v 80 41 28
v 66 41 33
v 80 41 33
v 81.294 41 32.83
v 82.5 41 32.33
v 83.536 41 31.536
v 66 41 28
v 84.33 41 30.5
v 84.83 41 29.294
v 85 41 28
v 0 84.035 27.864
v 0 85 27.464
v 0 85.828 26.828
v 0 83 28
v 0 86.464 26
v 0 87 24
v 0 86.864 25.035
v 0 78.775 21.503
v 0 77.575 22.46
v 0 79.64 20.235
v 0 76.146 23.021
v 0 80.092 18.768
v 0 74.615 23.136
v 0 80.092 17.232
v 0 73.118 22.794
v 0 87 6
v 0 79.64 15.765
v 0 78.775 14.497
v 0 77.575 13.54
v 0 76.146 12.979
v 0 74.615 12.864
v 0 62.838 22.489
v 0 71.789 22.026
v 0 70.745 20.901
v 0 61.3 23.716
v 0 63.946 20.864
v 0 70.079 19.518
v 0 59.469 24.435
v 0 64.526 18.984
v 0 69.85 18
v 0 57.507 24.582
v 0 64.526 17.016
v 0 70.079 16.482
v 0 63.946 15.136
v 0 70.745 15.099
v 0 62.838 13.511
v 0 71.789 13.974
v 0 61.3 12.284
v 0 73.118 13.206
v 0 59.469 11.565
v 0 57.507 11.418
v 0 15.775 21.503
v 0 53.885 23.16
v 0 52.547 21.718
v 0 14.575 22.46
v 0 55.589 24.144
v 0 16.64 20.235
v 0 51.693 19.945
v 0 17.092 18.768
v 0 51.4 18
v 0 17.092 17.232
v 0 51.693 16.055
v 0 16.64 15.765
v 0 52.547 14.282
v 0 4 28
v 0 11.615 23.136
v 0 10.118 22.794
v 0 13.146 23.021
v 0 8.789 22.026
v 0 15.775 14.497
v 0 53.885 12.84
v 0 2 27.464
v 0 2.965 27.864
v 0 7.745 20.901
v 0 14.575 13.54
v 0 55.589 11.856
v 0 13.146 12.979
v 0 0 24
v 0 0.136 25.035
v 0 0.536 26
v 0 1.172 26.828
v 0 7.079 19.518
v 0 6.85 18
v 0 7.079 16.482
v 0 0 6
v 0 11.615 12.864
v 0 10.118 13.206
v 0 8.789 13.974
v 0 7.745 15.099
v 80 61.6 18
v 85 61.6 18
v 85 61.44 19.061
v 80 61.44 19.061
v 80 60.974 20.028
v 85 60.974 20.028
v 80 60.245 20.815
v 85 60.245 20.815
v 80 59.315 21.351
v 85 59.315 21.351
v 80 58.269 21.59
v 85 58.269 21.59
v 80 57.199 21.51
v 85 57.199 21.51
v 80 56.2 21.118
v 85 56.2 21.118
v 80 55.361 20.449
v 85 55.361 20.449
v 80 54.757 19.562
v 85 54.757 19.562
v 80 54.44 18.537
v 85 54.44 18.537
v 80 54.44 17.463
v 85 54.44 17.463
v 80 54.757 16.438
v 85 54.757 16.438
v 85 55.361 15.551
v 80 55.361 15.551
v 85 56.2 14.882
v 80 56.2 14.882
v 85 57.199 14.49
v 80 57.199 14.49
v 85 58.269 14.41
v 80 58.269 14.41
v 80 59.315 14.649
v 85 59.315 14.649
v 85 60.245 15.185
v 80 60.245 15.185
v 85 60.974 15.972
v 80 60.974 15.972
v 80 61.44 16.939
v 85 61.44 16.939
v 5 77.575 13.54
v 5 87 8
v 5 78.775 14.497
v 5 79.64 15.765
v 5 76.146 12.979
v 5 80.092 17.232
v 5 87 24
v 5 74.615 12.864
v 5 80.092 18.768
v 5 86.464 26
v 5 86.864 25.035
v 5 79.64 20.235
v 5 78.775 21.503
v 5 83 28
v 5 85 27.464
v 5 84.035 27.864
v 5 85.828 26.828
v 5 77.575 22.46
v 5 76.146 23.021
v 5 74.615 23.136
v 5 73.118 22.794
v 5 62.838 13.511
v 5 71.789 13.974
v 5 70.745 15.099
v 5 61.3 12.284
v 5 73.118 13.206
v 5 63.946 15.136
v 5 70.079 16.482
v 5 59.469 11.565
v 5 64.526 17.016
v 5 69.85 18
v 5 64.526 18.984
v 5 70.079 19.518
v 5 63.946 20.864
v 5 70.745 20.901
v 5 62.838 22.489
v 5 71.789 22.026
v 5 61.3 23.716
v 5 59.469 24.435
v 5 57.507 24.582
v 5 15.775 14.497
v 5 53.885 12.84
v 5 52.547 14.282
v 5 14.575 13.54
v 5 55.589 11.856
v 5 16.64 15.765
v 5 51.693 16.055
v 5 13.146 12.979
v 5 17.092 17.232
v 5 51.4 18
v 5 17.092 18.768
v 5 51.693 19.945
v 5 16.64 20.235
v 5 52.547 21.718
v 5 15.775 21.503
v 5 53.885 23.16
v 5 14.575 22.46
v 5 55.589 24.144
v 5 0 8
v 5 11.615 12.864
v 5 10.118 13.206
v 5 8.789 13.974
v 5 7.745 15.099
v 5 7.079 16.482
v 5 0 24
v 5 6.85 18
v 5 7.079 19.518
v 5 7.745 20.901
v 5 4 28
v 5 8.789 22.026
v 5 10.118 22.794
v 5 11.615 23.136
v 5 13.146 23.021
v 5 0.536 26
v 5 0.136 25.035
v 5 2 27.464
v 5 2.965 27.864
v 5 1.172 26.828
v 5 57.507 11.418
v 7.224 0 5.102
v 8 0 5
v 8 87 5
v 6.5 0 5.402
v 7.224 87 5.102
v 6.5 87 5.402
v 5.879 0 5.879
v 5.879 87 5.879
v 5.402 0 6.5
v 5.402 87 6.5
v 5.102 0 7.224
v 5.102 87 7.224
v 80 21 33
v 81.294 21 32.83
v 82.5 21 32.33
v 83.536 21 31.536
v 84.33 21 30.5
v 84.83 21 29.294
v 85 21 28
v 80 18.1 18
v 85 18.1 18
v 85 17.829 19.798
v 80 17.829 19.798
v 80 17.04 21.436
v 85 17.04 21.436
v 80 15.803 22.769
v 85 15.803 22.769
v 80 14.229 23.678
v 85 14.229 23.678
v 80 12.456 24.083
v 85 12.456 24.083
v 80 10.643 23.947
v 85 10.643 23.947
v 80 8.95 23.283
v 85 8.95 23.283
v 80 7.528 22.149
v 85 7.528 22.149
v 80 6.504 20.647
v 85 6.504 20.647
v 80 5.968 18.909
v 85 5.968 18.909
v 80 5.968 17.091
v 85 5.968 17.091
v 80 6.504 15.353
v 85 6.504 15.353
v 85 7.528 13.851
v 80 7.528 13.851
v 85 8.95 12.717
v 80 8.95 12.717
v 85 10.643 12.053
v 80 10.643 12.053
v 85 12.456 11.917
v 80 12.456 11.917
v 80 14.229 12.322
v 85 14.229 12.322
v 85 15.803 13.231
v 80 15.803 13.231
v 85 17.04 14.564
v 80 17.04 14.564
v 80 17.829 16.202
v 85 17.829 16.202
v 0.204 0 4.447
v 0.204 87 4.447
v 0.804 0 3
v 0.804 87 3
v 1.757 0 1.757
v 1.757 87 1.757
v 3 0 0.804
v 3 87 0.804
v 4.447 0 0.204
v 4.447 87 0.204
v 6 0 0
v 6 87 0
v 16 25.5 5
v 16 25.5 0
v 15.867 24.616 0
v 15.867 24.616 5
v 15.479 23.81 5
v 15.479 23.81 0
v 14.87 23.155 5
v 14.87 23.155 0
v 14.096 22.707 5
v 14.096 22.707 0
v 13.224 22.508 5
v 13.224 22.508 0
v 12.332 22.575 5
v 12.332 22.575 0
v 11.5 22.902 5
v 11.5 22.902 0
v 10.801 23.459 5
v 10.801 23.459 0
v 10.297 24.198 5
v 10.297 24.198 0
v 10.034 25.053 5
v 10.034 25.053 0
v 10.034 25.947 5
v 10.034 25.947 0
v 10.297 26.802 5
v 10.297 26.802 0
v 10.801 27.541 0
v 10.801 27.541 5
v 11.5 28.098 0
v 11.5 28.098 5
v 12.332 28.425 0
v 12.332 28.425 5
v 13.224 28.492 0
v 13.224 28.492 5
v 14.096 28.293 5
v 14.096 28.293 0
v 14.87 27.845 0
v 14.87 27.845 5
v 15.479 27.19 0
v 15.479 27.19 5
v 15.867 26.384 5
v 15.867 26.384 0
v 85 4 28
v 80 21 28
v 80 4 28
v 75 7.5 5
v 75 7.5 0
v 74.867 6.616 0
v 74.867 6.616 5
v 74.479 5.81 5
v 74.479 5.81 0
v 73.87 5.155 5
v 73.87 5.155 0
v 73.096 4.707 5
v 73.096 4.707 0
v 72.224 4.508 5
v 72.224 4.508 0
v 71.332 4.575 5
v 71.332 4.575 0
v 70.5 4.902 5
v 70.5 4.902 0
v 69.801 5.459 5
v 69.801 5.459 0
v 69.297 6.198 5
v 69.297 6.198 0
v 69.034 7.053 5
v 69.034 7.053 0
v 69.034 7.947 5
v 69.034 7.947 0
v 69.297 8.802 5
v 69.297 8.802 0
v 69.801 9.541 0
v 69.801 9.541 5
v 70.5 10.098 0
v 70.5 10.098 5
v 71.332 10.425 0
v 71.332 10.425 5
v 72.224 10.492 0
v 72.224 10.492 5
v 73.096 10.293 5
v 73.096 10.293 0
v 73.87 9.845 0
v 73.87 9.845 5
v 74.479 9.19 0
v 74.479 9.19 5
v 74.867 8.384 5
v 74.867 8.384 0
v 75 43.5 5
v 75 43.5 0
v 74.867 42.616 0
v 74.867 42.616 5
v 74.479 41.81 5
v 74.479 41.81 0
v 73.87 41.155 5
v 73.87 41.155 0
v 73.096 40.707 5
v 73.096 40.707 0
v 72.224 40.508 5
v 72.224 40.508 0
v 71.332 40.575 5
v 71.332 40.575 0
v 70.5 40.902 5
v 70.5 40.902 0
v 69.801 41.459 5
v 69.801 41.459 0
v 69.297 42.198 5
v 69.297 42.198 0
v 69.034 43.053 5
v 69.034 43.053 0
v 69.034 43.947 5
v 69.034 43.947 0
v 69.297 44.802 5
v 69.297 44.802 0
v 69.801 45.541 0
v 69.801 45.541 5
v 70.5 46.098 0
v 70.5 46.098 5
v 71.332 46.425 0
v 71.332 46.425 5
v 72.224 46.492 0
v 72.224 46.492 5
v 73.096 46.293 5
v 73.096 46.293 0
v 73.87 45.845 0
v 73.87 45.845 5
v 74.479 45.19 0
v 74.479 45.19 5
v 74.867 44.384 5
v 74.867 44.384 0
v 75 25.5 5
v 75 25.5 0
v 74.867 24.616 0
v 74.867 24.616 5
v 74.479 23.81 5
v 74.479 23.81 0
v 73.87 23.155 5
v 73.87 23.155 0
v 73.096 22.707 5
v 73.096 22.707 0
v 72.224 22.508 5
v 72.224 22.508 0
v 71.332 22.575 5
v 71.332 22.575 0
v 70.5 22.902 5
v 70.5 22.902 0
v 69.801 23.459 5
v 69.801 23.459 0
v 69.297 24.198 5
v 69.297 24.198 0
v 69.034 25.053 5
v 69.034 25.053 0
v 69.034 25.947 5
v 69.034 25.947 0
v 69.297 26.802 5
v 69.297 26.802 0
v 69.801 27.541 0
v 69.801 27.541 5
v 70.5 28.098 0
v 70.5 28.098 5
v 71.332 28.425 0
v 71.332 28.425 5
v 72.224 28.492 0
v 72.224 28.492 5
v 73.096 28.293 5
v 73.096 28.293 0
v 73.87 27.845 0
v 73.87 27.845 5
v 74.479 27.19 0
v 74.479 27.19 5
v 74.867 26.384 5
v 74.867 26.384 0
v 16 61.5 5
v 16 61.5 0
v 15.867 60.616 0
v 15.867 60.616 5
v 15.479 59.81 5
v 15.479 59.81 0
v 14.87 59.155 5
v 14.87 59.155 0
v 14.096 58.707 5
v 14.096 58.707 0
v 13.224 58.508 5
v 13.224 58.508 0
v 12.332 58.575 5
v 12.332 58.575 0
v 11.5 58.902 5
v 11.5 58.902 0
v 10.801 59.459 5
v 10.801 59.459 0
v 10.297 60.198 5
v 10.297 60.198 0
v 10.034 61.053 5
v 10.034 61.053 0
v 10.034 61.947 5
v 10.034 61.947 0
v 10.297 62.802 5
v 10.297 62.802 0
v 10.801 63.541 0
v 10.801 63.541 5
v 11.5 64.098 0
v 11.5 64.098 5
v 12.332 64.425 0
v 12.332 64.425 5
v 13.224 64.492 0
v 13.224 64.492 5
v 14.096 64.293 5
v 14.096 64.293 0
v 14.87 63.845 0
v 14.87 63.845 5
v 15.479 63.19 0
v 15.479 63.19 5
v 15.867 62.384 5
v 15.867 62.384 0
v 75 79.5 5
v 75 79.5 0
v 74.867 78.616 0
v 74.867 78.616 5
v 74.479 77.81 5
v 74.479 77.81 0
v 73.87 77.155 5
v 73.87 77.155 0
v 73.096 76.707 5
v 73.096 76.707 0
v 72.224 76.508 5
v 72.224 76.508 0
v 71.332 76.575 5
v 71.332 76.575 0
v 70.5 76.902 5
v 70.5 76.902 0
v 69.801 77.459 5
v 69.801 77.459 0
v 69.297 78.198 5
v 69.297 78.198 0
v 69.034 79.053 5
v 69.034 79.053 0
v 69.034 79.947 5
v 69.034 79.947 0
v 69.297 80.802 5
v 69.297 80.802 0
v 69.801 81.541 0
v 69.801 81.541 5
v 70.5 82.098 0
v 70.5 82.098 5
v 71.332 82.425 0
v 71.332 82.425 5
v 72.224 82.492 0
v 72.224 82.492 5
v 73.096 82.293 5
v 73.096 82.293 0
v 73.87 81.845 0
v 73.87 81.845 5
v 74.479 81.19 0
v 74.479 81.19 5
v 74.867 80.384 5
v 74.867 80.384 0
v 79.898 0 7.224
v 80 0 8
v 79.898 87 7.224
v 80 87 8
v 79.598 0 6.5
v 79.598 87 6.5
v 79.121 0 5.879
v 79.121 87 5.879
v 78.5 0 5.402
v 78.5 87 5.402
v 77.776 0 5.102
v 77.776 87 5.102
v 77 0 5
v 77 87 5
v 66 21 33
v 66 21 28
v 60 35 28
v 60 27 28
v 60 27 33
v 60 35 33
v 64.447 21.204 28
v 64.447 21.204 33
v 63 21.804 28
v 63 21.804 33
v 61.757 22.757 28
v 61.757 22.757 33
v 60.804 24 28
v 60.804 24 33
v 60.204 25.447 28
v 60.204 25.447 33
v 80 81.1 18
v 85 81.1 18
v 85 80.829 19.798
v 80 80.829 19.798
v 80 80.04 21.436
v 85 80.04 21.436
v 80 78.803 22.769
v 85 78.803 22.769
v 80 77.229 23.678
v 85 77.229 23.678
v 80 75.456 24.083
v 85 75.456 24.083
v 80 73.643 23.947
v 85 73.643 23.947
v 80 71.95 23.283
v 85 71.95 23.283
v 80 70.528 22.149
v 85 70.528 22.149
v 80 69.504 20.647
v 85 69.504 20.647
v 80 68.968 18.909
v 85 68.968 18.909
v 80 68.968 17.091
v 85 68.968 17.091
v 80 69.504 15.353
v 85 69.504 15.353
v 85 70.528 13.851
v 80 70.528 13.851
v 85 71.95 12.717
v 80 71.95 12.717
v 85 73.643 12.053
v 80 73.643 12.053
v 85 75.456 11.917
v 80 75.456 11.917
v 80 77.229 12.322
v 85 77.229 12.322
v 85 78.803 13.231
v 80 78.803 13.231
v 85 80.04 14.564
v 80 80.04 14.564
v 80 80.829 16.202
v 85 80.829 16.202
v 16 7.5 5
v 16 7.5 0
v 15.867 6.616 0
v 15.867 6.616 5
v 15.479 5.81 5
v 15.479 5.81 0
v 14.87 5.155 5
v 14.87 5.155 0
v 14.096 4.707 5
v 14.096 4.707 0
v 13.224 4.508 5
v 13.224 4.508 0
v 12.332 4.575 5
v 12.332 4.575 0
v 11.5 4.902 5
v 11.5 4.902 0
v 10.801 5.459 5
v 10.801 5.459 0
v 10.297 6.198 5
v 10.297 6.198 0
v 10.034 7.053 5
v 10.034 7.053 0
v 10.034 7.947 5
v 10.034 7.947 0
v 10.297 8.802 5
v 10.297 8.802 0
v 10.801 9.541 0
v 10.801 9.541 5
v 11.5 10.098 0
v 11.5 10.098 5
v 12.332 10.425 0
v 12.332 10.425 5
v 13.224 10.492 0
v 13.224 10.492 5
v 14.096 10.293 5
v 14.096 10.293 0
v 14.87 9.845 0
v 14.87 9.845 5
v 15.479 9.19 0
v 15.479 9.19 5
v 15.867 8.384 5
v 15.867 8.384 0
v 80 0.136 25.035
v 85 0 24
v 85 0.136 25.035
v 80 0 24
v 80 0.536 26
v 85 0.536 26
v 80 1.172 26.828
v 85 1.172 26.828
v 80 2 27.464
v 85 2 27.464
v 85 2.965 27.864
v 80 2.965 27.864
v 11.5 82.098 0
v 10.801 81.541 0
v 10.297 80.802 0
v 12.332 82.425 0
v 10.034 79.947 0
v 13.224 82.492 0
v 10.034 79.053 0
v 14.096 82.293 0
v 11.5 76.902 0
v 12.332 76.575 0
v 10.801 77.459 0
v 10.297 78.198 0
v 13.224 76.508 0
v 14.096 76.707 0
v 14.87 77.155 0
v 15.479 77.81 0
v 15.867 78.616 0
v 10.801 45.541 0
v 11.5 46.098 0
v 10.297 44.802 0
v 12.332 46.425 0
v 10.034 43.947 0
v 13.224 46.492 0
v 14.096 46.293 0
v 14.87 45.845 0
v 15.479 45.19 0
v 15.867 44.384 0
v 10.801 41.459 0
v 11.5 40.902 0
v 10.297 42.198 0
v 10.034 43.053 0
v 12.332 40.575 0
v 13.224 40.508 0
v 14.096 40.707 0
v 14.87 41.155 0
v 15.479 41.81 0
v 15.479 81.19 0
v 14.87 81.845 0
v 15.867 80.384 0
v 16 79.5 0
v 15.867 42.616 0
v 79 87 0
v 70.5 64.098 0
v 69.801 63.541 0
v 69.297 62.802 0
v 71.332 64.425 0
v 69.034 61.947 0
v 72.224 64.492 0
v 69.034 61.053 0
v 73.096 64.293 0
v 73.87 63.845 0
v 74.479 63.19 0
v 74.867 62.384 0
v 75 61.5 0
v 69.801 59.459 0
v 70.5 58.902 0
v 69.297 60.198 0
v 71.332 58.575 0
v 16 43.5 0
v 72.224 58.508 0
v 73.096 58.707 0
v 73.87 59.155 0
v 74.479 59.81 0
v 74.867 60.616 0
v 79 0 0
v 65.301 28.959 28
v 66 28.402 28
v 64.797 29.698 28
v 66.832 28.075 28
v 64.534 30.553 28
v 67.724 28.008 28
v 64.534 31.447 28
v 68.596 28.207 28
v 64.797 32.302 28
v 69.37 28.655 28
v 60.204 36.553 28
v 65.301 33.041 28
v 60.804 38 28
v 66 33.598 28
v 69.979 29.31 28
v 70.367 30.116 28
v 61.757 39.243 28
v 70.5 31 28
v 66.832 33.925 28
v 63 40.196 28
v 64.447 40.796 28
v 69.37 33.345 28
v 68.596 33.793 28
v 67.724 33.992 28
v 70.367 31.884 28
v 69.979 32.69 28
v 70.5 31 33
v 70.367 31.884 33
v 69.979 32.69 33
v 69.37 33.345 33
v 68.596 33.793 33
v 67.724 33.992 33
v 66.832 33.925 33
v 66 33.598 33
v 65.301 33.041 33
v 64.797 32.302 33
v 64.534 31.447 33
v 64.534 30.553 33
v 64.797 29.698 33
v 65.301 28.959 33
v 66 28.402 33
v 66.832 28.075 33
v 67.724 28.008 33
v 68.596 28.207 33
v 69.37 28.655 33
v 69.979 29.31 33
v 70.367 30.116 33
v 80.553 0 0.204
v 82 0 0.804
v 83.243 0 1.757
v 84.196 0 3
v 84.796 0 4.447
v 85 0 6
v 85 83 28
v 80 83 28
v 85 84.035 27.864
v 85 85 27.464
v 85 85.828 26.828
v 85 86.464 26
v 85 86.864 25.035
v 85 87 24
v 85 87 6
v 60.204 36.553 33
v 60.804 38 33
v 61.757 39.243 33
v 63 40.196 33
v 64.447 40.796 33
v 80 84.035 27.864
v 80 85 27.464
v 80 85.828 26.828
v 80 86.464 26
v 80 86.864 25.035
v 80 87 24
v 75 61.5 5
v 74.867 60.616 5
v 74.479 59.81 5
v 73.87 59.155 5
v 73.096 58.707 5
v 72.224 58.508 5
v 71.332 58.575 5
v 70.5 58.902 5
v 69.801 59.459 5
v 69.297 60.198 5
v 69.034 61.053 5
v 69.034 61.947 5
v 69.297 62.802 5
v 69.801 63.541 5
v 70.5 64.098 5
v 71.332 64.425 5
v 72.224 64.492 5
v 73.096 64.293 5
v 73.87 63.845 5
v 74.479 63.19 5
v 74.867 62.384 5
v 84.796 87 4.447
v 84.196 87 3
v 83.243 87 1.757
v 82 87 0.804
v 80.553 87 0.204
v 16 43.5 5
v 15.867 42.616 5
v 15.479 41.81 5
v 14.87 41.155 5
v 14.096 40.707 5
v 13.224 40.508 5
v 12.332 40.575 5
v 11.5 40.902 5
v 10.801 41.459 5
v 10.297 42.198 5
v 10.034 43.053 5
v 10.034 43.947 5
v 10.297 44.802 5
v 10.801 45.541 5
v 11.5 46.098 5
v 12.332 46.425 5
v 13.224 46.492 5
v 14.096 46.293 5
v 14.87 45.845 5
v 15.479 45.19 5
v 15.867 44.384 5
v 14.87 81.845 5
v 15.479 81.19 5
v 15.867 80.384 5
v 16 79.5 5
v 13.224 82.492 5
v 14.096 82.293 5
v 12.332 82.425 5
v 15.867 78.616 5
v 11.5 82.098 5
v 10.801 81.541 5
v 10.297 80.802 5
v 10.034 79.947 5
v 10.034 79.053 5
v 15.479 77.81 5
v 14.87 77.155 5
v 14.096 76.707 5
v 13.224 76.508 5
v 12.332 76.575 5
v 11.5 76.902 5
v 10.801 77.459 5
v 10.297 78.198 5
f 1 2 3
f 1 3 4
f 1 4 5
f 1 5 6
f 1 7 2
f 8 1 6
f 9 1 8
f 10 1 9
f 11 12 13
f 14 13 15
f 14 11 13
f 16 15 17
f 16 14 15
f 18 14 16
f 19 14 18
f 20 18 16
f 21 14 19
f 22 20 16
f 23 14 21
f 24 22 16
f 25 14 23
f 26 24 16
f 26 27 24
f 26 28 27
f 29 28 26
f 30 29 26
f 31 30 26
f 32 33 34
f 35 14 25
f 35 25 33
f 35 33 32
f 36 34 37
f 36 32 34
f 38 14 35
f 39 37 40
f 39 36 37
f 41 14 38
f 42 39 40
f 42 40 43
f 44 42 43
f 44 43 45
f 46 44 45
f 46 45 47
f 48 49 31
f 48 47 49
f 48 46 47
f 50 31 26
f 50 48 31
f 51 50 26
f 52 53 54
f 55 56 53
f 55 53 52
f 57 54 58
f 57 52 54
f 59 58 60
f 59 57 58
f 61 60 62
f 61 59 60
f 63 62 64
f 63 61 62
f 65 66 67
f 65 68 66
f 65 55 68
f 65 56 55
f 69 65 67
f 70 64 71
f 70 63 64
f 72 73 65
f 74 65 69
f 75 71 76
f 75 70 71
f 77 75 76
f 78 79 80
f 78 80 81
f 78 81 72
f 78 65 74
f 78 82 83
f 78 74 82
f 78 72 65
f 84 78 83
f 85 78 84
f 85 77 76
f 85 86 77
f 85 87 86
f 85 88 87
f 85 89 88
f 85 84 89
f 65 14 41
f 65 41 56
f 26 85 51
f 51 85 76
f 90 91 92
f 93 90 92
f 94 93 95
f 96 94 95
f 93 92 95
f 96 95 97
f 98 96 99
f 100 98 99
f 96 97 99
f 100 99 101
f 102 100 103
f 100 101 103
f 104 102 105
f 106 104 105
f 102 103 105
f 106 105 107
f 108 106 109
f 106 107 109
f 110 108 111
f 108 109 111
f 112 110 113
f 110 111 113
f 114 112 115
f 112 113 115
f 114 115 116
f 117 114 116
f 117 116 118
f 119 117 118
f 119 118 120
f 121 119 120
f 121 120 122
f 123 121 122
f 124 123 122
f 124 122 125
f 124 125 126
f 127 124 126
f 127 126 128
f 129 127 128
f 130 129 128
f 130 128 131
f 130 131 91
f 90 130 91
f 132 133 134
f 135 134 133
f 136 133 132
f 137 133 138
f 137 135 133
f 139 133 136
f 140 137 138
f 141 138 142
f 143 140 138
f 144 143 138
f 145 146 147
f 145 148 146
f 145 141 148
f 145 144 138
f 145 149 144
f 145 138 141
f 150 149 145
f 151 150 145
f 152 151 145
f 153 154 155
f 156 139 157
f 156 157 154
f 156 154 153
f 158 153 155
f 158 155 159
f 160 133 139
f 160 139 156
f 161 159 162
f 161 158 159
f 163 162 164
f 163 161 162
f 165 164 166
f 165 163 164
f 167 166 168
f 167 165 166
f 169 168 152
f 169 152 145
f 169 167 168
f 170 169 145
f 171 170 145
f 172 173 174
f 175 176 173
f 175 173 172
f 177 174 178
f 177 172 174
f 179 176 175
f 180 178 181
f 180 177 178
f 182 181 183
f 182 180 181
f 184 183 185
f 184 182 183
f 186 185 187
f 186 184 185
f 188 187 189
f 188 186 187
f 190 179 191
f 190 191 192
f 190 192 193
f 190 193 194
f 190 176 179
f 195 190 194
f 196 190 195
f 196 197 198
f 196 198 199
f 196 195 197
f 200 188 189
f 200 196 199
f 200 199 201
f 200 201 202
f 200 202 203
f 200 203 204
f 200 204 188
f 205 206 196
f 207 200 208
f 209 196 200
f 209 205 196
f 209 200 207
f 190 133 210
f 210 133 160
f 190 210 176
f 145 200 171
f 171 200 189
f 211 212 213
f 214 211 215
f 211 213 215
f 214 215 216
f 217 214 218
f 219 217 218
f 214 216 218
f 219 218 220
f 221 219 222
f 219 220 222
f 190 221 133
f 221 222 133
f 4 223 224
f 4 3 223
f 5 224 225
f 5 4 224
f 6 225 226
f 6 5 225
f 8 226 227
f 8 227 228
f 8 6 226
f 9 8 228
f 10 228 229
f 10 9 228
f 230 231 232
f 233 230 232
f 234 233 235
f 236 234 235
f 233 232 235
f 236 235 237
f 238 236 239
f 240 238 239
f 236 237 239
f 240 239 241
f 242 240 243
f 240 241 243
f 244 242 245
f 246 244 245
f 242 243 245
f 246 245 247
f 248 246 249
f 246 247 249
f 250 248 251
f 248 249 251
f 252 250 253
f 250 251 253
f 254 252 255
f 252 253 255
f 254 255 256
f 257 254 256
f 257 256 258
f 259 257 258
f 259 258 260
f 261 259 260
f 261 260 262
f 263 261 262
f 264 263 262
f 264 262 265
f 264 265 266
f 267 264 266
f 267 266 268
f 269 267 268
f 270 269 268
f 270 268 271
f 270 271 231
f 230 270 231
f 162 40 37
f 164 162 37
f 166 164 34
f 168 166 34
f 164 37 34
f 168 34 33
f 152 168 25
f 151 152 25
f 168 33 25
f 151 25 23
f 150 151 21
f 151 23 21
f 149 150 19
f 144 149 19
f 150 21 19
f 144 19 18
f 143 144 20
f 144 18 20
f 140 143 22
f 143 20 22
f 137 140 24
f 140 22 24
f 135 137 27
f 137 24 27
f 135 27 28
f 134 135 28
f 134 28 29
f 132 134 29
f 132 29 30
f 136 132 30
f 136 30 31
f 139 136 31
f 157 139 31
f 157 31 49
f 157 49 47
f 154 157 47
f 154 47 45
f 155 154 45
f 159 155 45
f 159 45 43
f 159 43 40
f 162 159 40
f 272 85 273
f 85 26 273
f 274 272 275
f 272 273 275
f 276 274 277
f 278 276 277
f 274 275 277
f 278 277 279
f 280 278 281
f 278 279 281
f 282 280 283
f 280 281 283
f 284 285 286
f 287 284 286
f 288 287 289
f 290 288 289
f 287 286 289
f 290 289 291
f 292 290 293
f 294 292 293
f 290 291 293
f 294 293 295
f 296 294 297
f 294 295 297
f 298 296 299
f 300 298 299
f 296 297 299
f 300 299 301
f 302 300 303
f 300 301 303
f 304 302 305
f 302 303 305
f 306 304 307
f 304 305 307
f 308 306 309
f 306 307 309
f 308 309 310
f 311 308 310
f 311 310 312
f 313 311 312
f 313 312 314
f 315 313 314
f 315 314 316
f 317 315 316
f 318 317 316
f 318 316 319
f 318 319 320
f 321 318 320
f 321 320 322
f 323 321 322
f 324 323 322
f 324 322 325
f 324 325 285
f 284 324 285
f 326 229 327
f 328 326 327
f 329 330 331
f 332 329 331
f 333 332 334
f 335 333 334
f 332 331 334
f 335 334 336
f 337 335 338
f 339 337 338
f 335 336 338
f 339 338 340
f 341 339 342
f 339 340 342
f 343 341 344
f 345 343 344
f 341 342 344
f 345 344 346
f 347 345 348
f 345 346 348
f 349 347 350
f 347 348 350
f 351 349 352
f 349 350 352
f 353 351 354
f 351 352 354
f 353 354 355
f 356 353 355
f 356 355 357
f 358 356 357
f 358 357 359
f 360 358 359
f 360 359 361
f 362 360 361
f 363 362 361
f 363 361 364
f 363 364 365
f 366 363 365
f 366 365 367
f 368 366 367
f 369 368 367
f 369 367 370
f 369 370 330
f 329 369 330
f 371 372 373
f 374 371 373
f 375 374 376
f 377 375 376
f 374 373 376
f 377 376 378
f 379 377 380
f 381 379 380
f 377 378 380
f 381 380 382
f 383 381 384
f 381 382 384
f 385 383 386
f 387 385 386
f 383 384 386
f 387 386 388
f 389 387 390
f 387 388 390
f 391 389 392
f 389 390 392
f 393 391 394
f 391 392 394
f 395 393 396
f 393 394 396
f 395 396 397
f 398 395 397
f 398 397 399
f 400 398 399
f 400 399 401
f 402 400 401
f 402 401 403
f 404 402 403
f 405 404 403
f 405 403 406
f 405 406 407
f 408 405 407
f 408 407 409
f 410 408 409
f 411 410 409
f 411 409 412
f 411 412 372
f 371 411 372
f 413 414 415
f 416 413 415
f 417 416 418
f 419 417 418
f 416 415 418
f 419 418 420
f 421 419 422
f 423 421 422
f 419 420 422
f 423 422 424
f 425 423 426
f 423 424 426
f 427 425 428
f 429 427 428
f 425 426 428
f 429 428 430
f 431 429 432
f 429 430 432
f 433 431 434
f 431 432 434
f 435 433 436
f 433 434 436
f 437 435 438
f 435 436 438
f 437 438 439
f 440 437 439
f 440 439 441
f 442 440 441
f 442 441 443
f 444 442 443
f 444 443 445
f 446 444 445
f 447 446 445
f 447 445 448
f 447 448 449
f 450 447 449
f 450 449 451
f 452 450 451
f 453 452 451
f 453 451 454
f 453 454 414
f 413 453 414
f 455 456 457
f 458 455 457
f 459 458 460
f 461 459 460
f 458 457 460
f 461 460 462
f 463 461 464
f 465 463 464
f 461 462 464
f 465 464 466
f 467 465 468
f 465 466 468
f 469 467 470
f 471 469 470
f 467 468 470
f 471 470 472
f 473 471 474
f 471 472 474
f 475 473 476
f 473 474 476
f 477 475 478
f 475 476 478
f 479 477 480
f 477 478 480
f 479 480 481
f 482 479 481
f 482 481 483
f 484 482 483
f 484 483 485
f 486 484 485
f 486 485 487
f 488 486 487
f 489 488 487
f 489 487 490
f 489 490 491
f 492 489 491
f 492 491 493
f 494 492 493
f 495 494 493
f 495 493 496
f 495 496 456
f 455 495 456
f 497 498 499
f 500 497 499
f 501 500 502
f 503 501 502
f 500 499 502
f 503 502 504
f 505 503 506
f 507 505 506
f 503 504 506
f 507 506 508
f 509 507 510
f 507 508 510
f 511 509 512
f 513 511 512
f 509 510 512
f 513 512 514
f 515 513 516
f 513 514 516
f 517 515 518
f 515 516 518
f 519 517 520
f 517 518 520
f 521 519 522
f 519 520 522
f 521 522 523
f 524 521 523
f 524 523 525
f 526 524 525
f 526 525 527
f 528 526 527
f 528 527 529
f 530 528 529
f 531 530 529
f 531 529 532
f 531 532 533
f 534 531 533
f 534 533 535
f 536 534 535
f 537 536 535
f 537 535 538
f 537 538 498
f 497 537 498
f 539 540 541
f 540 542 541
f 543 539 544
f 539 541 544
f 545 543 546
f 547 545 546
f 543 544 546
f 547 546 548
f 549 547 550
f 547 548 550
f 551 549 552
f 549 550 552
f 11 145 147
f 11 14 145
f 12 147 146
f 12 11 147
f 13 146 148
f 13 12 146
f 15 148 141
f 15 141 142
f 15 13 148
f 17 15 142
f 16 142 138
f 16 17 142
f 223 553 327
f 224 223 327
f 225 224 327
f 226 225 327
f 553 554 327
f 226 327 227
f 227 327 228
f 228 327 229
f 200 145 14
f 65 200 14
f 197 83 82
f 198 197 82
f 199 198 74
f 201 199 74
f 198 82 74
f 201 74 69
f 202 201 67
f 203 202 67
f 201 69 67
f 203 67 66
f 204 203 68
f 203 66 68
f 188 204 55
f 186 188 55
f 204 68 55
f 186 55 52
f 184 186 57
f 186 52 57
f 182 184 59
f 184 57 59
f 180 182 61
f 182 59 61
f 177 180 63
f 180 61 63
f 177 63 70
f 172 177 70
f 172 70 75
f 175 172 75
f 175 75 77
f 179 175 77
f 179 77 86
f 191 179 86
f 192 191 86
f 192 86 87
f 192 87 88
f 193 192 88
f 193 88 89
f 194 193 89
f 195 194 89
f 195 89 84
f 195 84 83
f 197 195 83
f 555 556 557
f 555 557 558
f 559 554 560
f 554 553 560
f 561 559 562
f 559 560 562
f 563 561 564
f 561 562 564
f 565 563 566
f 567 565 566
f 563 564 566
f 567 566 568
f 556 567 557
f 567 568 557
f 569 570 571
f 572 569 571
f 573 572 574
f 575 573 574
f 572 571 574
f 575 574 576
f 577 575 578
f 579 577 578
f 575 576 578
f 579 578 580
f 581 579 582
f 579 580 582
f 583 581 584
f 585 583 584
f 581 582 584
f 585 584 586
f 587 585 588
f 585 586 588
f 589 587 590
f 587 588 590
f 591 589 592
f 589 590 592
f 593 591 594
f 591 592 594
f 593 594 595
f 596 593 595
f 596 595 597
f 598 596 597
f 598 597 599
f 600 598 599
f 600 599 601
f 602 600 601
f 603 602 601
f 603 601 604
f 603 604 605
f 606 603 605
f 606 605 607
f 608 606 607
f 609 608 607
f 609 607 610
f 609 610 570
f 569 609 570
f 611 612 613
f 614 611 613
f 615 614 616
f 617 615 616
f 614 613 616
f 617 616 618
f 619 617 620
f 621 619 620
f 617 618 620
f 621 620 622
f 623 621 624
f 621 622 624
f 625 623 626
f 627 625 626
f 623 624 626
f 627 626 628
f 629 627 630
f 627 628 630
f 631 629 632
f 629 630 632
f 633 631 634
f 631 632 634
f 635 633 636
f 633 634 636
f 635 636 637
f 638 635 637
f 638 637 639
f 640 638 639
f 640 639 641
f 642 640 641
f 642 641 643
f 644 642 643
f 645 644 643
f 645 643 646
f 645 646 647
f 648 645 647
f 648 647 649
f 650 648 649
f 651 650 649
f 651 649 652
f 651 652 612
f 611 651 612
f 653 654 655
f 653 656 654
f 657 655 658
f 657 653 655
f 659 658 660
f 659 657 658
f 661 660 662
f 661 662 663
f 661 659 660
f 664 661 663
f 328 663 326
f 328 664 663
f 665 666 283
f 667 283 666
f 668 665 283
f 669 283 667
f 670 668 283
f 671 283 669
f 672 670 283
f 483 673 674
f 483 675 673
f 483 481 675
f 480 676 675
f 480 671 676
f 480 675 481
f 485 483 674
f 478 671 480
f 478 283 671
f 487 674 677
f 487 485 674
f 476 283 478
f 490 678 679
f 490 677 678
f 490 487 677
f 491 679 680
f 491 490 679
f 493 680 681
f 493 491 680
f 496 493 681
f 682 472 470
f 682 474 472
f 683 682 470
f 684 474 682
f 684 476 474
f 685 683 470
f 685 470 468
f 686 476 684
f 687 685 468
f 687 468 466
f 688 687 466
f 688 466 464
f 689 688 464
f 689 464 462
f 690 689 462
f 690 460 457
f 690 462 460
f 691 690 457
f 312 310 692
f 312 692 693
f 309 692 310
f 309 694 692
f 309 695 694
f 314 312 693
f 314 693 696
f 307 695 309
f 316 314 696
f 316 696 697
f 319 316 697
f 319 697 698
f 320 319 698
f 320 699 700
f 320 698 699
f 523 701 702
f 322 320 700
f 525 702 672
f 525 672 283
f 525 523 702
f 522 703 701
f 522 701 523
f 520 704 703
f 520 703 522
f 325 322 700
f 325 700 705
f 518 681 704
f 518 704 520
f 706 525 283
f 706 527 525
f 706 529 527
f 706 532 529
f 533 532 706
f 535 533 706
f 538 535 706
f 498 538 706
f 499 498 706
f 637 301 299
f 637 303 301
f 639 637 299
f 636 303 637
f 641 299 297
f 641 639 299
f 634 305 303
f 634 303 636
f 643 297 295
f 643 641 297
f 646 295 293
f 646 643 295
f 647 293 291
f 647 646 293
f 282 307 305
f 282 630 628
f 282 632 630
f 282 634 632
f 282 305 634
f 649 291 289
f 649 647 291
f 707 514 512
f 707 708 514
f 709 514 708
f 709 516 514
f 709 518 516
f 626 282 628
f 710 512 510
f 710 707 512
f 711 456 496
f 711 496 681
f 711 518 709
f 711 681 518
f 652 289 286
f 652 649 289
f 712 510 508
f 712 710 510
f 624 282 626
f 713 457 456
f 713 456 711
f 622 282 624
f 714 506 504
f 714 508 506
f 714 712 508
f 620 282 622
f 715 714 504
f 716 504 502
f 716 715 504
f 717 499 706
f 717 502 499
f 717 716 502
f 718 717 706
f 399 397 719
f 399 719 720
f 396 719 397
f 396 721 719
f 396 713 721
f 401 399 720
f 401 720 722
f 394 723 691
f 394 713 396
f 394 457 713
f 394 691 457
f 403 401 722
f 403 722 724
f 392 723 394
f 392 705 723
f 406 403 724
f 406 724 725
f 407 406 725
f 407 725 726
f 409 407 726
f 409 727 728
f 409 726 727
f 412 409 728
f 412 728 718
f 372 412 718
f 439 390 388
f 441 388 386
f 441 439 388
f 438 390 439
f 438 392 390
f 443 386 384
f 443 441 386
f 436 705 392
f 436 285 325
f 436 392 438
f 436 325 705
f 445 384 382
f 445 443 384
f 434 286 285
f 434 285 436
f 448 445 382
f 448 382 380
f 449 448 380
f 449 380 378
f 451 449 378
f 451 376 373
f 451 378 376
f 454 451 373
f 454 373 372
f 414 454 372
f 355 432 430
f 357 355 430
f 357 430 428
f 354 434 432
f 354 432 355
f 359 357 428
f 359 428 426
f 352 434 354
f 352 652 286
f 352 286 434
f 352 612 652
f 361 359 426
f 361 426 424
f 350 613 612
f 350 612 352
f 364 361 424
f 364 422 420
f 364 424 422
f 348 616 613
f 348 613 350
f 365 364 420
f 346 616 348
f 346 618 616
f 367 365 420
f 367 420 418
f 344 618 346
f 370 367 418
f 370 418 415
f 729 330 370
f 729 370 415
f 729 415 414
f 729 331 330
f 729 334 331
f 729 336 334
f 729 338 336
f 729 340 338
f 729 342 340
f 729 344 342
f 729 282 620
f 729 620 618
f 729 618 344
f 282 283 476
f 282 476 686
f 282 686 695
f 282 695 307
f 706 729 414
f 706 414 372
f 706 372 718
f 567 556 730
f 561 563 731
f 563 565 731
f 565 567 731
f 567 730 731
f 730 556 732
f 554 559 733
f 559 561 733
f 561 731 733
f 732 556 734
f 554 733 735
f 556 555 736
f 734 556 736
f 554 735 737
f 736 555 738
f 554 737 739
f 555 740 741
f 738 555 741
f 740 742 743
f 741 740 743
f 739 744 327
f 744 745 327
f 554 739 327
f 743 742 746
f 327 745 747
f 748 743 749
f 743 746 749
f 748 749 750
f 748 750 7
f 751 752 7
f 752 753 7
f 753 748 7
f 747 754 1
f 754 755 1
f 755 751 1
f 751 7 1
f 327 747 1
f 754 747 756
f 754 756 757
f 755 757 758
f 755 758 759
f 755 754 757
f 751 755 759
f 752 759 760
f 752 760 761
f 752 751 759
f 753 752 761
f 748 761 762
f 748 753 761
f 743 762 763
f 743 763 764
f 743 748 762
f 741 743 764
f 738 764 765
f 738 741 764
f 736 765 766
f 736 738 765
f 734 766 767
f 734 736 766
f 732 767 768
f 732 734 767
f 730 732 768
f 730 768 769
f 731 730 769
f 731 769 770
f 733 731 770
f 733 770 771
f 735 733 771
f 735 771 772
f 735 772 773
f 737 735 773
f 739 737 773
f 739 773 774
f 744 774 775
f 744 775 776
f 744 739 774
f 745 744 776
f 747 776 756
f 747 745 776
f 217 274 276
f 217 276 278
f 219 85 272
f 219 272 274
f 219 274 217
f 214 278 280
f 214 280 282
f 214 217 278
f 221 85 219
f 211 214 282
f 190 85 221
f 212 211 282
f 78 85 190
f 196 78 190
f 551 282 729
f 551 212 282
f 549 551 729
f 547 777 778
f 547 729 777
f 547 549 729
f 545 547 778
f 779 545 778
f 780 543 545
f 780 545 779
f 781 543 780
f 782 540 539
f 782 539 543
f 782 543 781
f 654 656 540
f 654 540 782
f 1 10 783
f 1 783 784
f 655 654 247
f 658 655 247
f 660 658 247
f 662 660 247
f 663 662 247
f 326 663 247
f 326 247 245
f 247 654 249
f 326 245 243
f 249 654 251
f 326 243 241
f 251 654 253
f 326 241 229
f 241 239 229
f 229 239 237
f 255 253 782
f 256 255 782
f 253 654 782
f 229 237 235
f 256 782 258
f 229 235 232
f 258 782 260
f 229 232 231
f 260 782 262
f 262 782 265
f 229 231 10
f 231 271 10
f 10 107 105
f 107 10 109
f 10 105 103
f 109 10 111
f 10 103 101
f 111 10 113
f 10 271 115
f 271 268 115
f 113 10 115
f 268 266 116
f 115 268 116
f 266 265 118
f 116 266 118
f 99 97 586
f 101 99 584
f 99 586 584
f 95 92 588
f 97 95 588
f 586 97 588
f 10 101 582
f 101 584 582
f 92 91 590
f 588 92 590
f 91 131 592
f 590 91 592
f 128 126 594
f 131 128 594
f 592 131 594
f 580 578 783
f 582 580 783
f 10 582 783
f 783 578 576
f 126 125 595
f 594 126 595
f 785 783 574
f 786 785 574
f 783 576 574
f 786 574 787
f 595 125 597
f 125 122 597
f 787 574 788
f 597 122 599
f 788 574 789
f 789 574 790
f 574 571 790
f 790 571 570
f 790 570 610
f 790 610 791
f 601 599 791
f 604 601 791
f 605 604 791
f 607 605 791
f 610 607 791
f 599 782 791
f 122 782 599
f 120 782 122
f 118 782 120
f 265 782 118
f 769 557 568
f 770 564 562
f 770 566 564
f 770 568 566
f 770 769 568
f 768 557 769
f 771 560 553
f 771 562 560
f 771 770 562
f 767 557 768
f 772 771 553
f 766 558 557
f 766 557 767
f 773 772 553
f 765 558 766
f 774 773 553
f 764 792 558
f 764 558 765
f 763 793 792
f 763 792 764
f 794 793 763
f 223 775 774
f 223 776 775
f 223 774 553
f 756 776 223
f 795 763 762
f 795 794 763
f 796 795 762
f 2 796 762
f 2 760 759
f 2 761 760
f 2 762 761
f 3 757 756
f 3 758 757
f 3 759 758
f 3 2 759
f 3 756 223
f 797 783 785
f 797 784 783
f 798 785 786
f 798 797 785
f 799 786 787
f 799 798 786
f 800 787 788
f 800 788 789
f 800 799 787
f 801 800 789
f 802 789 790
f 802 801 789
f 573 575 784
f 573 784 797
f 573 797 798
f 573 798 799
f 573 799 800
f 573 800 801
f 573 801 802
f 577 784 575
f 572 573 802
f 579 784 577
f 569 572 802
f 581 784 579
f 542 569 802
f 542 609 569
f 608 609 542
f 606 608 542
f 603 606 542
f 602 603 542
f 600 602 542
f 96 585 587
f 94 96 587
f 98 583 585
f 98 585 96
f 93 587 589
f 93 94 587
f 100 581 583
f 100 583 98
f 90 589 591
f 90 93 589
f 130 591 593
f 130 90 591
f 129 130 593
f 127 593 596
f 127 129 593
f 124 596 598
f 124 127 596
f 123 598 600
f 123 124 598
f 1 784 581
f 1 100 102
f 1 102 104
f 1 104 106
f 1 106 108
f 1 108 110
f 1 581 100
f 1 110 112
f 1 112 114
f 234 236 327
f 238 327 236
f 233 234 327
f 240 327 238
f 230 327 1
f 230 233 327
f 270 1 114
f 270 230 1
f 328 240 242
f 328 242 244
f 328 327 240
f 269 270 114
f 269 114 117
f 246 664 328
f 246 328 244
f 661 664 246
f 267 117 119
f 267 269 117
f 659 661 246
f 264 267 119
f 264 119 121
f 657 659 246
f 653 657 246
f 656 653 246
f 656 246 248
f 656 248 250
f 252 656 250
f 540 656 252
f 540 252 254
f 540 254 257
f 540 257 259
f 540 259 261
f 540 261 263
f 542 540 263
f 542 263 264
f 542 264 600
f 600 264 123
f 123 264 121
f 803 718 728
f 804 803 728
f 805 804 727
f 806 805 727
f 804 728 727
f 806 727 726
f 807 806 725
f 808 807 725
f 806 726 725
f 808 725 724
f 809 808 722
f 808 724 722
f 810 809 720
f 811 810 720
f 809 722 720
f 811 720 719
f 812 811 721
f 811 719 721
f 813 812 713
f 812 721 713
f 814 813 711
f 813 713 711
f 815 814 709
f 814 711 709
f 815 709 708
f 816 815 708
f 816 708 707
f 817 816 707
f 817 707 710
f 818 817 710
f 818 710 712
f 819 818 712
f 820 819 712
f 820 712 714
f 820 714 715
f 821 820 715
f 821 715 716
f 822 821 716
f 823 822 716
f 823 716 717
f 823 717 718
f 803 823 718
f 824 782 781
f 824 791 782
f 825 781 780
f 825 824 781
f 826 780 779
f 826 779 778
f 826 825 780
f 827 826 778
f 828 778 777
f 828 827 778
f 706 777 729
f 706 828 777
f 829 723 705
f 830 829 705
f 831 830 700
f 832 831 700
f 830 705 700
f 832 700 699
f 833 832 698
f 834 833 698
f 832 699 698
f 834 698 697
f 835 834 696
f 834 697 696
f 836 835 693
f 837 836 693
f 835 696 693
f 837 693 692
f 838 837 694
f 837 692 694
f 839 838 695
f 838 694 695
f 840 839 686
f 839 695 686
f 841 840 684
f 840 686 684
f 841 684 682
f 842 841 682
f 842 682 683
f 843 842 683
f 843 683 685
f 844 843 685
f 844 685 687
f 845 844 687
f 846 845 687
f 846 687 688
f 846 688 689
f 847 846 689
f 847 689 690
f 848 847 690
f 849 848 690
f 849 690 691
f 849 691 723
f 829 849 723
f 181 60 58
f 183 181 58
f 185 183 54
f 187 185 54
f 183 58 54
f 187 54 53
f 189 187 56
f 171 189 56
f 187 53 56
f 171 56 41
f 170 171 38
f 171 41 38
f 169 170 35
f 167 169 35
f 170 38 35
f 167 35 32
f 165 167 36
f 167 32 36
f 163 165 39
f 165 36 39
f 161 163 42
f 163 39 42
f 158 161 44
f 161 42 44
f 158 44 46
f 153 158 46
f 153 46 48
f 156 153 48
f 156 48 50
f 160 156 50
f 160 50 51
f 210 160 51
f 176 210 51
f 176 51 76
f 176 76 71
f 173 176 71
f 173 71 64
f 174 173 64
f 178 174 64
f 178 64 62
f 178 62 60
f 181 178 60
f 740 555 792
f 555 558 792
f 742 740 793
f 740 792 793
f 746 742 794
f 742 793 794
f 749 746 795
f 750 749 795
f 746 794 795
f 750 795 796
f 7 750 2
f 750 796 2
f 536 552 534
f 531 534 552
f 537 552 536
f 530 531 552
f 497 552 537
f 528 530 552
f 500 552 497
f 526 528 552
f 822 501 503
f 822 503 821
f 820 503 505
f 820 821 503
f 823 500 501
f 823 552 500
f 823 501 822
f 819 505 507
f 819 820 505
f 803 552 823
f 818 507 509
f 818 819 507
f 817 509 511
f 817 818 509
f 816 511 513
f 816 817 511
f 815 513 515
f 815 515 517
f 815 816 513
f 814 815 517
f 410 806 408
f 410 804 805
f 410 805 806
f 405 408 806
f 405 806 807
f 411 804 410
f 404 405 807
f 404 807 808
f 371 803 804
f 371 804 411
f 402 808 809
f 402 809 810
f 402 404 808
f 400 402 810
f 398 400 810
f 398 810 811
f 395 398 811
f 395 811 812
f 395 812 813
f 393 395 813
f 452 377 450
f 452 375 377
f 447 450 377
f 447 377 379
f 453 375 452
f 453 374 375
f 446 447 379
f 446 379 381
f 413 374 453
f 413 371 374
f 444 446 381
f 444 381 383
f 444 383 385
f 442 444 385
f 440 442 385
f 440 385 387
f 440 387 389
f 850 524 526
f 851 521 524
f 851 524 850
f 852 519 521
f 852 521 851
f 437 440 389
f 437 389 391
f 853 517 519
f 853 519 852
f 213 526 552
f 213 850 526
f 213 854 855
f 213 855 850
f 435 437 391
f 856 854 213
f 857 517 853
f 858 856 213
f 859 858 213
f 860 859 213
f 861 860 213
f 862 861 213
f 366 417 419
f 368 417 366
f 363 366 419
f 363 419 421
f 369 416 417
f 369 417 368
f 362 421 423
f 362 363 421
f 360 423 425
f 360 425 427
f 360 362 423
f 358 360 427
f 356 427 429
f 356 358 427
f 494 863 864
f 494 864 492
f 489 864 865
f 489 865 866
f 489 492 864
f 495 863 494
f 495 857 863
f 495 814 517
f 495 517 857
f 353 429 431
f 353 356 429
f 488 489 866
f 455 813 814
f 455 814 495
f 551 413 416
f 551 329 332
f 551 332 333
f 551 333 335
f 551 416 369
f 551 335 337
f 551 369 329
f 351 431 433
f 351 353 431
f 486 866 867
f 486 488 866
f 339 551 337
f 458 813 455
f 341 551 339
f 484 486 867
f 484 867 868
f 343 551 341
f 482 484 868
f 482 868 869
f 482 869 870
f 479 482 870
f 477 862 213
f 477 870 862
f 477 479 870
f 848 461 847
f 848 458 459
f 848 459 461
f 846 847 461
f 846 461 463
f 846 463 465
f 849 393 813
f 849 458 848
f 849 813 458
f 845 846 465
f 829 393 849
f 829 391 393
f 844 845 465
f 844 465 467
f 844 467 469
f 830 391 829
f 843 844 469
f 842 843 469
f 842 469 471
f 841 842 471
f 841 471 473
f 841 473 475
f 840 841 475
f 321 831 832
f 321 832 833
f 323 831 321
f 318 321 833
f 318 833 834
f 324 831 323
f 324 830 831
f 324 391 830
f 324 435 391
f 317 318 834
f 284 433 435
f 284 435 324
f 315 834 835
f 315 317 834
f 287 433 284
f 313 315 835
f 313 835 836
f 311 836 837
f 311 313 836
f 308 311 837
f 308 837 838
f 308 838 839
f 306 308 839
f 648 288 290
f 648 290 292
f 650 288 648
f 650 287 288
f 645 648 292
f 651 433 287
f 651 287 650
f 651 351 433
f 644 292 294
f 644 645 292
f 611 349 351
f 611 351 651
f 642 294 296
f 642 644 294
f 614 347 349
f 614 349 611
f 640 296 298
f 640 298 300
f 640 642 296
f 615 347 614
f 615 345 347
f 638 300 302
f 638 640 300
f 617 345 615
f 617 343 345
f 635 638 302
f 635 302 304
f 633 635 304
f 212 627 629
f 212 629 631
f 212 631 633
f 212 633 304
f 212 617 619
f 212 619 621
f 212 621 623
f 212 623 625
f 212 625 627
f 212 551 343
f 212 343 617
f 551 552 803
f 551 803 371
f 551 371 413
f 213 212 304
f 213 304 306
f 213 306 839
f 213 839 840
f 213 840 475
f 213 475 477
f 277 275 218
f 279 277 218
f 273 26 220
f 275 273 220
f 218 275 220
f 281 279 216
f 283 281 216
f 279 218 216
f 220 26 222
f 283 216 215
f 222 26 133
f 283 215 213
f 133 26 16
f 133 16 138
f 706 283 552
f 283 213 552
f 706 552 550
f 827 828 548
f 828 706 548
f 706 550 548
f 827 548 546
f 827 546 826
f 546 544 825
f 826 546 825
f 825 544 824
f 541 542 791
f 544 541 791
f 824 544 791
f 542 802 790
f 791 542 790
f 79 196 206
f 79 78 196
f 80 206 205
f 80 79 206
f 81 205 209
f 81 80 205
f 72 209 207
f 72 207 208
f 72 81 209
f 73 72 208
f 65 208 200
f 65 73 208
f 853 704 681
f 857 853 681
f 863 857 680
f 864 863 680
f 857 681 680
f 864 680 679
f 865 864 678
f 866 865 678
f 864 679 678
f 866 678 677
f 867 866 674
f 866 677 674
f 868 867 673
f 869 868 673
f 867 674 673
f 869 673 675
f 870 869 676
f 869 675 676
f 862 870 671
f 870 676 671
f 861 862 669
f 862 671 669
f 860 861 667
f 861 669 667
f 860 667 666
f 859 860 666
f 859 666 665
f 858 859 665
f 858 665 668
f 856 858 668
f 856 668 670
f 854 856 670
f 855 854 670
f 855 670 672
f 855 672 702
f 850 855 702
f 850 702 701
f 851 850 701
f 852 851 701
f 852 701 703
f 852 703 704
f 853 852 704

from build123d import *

# Parameters (mm, degrees)
F1_DEPTH  = 87
F2_R      = 3
F3_R      = 6
F4_R      = 3
F5_R      = 4
F6_W      = 25
F6_H      = 20
F6_R      = 3
F7_DEPTH  = 5
F8_R      = 5
F9_R      = 6
F10_R     = 5.15
F10_R_2   = 6.6
F11_DEPTH = 25
F12_R     = 6.1
F12_R_2   = 3.6
F13_DEPTH = 25
F14_R     = 3
F15_DEPTH = 25


with BuildPart() as f1:
    # F0 (on Front) → F1 (new body)
    with BuildSketch(Plane.XZ):
        Polygon((0, 28), (0, 0), (85, 0), (85, 28), (80, 28), (80, 5), (5, 5), (5, 28), align=None)
    extrude(amount=-F1_DEPTH)

    # F2
    f2_edges = [f1.edges().sort_by_distance(p)[0] for p in [
        (5, 43.5, 5),
    ]]
    fillet(f2_edges, radius=F2_R)

    # F3
    f3_edges = [f1.edges().sort_by_distance(p)[0] for p in [
        (0, 43.5, 0),
        (85, 43.5, 0),
    ]]
    fillet(f3_edges, radius=F3_R)

    # F4
    f4_edges = [f1.edges().sort_by_distance(p)[0] for p in [
        (80, 43.5, 5),
    ]]
    fillet(f4_edges, radius=F4_R)

    # F5
    f5_edges = [f1.edges().sort_by_distance(p)[0] for p in [
        (82.5, 0, 28),
        (2.5, 0, 28),
        (2.5, 87, 28),
        (82.5, 87, 28),
    ]]
    fillet(f5_edges, radius=F5_R)

    # F6 (on face) → F7 (join)
    with BuildSketch(Plane.XY.offset(28)):
        with Locations((72.5, 31)):
            Rectangle(F6_W, F6_H)
        with Locations((67.5, 31)):
            Circle(F6_R, mode=Mode.SUBTRACT)
    extrude(amount=F7_DEPTH)

    # F8
    f8_edges = [f1.edges().sort_by_distance(p)[0] for p in [
        (85, 31, 33),
    ]]
    fillet(f8_edges, radius=F8_R)

    # F9
    f9_edges = [f1.edges().sort_by_distance(p)[0] for p in [
        (60, 21, 30.5),
        (60, 41, 30.5),
    ]]
    fillet(f9_edges, radius=F9_R)

    # F10 (on face) → F11 (cut)
    with BuildSketch(Plane(origin=(0, 0, 0), x_dir=(0, -1, 0), z_dir=(-1, 0, 0))):
        with Locations((-12, 18)):
            Circle(F10_R)
        with Locations((-58, 18)):
            Circle(F10_R_2)
        with Locations((-75, 18)):
            Circle(F10_R)
    extrude(amount=-F11_DEPTH, mode=Mode.SUBTRACT)

    # F12 (on face) → F13 (cut)
    with BuildSketch(Plane.YZ.offset(85)):
        with Locations((75, 18)):
            Circle(F12_R)
        with Locations((58, 18)):
            Circle(F12_R_2)
        with Locations((12, 18)):
            Circle(F12_R)
    extrude(amount=-F13_DEPTH, mode=Mode.SUBTRACT)

    # F14 (on face) → F15 (cut)
    with BuildSketch(Plane(origin=(0, 0, 0), x_dir=(1, 0, 0), z_dir=(0, 0, -1))):
        with Locations((13, -7.5)):
            Circle(F14_R)
        with Locations((13, -25.5)):
            Circle(F14_R)
        with Locations((13, -43.5)):
            Circle(F14_R)
        with Locations((13, -79.5)):
            Circle(F14_R)
        with Locations((13, -61.5)):
            Circle(F14_R)
        with Locations((72, -79.5)):
            Circle(F14_R)
        with Locations((72, -61.5)):
            Circle(F14_R)
        with Locations((72, -43.5)):
            Circle(F14_R)
        with Locations((72, -7.5)):
            Circle(F14_R)
        with Locations((72, -25.5)):
            Circle(F14_R)
    extrude(amount=-F15_DEPTH, mode=Mode.SUBTRACT)


solid = f1.part
